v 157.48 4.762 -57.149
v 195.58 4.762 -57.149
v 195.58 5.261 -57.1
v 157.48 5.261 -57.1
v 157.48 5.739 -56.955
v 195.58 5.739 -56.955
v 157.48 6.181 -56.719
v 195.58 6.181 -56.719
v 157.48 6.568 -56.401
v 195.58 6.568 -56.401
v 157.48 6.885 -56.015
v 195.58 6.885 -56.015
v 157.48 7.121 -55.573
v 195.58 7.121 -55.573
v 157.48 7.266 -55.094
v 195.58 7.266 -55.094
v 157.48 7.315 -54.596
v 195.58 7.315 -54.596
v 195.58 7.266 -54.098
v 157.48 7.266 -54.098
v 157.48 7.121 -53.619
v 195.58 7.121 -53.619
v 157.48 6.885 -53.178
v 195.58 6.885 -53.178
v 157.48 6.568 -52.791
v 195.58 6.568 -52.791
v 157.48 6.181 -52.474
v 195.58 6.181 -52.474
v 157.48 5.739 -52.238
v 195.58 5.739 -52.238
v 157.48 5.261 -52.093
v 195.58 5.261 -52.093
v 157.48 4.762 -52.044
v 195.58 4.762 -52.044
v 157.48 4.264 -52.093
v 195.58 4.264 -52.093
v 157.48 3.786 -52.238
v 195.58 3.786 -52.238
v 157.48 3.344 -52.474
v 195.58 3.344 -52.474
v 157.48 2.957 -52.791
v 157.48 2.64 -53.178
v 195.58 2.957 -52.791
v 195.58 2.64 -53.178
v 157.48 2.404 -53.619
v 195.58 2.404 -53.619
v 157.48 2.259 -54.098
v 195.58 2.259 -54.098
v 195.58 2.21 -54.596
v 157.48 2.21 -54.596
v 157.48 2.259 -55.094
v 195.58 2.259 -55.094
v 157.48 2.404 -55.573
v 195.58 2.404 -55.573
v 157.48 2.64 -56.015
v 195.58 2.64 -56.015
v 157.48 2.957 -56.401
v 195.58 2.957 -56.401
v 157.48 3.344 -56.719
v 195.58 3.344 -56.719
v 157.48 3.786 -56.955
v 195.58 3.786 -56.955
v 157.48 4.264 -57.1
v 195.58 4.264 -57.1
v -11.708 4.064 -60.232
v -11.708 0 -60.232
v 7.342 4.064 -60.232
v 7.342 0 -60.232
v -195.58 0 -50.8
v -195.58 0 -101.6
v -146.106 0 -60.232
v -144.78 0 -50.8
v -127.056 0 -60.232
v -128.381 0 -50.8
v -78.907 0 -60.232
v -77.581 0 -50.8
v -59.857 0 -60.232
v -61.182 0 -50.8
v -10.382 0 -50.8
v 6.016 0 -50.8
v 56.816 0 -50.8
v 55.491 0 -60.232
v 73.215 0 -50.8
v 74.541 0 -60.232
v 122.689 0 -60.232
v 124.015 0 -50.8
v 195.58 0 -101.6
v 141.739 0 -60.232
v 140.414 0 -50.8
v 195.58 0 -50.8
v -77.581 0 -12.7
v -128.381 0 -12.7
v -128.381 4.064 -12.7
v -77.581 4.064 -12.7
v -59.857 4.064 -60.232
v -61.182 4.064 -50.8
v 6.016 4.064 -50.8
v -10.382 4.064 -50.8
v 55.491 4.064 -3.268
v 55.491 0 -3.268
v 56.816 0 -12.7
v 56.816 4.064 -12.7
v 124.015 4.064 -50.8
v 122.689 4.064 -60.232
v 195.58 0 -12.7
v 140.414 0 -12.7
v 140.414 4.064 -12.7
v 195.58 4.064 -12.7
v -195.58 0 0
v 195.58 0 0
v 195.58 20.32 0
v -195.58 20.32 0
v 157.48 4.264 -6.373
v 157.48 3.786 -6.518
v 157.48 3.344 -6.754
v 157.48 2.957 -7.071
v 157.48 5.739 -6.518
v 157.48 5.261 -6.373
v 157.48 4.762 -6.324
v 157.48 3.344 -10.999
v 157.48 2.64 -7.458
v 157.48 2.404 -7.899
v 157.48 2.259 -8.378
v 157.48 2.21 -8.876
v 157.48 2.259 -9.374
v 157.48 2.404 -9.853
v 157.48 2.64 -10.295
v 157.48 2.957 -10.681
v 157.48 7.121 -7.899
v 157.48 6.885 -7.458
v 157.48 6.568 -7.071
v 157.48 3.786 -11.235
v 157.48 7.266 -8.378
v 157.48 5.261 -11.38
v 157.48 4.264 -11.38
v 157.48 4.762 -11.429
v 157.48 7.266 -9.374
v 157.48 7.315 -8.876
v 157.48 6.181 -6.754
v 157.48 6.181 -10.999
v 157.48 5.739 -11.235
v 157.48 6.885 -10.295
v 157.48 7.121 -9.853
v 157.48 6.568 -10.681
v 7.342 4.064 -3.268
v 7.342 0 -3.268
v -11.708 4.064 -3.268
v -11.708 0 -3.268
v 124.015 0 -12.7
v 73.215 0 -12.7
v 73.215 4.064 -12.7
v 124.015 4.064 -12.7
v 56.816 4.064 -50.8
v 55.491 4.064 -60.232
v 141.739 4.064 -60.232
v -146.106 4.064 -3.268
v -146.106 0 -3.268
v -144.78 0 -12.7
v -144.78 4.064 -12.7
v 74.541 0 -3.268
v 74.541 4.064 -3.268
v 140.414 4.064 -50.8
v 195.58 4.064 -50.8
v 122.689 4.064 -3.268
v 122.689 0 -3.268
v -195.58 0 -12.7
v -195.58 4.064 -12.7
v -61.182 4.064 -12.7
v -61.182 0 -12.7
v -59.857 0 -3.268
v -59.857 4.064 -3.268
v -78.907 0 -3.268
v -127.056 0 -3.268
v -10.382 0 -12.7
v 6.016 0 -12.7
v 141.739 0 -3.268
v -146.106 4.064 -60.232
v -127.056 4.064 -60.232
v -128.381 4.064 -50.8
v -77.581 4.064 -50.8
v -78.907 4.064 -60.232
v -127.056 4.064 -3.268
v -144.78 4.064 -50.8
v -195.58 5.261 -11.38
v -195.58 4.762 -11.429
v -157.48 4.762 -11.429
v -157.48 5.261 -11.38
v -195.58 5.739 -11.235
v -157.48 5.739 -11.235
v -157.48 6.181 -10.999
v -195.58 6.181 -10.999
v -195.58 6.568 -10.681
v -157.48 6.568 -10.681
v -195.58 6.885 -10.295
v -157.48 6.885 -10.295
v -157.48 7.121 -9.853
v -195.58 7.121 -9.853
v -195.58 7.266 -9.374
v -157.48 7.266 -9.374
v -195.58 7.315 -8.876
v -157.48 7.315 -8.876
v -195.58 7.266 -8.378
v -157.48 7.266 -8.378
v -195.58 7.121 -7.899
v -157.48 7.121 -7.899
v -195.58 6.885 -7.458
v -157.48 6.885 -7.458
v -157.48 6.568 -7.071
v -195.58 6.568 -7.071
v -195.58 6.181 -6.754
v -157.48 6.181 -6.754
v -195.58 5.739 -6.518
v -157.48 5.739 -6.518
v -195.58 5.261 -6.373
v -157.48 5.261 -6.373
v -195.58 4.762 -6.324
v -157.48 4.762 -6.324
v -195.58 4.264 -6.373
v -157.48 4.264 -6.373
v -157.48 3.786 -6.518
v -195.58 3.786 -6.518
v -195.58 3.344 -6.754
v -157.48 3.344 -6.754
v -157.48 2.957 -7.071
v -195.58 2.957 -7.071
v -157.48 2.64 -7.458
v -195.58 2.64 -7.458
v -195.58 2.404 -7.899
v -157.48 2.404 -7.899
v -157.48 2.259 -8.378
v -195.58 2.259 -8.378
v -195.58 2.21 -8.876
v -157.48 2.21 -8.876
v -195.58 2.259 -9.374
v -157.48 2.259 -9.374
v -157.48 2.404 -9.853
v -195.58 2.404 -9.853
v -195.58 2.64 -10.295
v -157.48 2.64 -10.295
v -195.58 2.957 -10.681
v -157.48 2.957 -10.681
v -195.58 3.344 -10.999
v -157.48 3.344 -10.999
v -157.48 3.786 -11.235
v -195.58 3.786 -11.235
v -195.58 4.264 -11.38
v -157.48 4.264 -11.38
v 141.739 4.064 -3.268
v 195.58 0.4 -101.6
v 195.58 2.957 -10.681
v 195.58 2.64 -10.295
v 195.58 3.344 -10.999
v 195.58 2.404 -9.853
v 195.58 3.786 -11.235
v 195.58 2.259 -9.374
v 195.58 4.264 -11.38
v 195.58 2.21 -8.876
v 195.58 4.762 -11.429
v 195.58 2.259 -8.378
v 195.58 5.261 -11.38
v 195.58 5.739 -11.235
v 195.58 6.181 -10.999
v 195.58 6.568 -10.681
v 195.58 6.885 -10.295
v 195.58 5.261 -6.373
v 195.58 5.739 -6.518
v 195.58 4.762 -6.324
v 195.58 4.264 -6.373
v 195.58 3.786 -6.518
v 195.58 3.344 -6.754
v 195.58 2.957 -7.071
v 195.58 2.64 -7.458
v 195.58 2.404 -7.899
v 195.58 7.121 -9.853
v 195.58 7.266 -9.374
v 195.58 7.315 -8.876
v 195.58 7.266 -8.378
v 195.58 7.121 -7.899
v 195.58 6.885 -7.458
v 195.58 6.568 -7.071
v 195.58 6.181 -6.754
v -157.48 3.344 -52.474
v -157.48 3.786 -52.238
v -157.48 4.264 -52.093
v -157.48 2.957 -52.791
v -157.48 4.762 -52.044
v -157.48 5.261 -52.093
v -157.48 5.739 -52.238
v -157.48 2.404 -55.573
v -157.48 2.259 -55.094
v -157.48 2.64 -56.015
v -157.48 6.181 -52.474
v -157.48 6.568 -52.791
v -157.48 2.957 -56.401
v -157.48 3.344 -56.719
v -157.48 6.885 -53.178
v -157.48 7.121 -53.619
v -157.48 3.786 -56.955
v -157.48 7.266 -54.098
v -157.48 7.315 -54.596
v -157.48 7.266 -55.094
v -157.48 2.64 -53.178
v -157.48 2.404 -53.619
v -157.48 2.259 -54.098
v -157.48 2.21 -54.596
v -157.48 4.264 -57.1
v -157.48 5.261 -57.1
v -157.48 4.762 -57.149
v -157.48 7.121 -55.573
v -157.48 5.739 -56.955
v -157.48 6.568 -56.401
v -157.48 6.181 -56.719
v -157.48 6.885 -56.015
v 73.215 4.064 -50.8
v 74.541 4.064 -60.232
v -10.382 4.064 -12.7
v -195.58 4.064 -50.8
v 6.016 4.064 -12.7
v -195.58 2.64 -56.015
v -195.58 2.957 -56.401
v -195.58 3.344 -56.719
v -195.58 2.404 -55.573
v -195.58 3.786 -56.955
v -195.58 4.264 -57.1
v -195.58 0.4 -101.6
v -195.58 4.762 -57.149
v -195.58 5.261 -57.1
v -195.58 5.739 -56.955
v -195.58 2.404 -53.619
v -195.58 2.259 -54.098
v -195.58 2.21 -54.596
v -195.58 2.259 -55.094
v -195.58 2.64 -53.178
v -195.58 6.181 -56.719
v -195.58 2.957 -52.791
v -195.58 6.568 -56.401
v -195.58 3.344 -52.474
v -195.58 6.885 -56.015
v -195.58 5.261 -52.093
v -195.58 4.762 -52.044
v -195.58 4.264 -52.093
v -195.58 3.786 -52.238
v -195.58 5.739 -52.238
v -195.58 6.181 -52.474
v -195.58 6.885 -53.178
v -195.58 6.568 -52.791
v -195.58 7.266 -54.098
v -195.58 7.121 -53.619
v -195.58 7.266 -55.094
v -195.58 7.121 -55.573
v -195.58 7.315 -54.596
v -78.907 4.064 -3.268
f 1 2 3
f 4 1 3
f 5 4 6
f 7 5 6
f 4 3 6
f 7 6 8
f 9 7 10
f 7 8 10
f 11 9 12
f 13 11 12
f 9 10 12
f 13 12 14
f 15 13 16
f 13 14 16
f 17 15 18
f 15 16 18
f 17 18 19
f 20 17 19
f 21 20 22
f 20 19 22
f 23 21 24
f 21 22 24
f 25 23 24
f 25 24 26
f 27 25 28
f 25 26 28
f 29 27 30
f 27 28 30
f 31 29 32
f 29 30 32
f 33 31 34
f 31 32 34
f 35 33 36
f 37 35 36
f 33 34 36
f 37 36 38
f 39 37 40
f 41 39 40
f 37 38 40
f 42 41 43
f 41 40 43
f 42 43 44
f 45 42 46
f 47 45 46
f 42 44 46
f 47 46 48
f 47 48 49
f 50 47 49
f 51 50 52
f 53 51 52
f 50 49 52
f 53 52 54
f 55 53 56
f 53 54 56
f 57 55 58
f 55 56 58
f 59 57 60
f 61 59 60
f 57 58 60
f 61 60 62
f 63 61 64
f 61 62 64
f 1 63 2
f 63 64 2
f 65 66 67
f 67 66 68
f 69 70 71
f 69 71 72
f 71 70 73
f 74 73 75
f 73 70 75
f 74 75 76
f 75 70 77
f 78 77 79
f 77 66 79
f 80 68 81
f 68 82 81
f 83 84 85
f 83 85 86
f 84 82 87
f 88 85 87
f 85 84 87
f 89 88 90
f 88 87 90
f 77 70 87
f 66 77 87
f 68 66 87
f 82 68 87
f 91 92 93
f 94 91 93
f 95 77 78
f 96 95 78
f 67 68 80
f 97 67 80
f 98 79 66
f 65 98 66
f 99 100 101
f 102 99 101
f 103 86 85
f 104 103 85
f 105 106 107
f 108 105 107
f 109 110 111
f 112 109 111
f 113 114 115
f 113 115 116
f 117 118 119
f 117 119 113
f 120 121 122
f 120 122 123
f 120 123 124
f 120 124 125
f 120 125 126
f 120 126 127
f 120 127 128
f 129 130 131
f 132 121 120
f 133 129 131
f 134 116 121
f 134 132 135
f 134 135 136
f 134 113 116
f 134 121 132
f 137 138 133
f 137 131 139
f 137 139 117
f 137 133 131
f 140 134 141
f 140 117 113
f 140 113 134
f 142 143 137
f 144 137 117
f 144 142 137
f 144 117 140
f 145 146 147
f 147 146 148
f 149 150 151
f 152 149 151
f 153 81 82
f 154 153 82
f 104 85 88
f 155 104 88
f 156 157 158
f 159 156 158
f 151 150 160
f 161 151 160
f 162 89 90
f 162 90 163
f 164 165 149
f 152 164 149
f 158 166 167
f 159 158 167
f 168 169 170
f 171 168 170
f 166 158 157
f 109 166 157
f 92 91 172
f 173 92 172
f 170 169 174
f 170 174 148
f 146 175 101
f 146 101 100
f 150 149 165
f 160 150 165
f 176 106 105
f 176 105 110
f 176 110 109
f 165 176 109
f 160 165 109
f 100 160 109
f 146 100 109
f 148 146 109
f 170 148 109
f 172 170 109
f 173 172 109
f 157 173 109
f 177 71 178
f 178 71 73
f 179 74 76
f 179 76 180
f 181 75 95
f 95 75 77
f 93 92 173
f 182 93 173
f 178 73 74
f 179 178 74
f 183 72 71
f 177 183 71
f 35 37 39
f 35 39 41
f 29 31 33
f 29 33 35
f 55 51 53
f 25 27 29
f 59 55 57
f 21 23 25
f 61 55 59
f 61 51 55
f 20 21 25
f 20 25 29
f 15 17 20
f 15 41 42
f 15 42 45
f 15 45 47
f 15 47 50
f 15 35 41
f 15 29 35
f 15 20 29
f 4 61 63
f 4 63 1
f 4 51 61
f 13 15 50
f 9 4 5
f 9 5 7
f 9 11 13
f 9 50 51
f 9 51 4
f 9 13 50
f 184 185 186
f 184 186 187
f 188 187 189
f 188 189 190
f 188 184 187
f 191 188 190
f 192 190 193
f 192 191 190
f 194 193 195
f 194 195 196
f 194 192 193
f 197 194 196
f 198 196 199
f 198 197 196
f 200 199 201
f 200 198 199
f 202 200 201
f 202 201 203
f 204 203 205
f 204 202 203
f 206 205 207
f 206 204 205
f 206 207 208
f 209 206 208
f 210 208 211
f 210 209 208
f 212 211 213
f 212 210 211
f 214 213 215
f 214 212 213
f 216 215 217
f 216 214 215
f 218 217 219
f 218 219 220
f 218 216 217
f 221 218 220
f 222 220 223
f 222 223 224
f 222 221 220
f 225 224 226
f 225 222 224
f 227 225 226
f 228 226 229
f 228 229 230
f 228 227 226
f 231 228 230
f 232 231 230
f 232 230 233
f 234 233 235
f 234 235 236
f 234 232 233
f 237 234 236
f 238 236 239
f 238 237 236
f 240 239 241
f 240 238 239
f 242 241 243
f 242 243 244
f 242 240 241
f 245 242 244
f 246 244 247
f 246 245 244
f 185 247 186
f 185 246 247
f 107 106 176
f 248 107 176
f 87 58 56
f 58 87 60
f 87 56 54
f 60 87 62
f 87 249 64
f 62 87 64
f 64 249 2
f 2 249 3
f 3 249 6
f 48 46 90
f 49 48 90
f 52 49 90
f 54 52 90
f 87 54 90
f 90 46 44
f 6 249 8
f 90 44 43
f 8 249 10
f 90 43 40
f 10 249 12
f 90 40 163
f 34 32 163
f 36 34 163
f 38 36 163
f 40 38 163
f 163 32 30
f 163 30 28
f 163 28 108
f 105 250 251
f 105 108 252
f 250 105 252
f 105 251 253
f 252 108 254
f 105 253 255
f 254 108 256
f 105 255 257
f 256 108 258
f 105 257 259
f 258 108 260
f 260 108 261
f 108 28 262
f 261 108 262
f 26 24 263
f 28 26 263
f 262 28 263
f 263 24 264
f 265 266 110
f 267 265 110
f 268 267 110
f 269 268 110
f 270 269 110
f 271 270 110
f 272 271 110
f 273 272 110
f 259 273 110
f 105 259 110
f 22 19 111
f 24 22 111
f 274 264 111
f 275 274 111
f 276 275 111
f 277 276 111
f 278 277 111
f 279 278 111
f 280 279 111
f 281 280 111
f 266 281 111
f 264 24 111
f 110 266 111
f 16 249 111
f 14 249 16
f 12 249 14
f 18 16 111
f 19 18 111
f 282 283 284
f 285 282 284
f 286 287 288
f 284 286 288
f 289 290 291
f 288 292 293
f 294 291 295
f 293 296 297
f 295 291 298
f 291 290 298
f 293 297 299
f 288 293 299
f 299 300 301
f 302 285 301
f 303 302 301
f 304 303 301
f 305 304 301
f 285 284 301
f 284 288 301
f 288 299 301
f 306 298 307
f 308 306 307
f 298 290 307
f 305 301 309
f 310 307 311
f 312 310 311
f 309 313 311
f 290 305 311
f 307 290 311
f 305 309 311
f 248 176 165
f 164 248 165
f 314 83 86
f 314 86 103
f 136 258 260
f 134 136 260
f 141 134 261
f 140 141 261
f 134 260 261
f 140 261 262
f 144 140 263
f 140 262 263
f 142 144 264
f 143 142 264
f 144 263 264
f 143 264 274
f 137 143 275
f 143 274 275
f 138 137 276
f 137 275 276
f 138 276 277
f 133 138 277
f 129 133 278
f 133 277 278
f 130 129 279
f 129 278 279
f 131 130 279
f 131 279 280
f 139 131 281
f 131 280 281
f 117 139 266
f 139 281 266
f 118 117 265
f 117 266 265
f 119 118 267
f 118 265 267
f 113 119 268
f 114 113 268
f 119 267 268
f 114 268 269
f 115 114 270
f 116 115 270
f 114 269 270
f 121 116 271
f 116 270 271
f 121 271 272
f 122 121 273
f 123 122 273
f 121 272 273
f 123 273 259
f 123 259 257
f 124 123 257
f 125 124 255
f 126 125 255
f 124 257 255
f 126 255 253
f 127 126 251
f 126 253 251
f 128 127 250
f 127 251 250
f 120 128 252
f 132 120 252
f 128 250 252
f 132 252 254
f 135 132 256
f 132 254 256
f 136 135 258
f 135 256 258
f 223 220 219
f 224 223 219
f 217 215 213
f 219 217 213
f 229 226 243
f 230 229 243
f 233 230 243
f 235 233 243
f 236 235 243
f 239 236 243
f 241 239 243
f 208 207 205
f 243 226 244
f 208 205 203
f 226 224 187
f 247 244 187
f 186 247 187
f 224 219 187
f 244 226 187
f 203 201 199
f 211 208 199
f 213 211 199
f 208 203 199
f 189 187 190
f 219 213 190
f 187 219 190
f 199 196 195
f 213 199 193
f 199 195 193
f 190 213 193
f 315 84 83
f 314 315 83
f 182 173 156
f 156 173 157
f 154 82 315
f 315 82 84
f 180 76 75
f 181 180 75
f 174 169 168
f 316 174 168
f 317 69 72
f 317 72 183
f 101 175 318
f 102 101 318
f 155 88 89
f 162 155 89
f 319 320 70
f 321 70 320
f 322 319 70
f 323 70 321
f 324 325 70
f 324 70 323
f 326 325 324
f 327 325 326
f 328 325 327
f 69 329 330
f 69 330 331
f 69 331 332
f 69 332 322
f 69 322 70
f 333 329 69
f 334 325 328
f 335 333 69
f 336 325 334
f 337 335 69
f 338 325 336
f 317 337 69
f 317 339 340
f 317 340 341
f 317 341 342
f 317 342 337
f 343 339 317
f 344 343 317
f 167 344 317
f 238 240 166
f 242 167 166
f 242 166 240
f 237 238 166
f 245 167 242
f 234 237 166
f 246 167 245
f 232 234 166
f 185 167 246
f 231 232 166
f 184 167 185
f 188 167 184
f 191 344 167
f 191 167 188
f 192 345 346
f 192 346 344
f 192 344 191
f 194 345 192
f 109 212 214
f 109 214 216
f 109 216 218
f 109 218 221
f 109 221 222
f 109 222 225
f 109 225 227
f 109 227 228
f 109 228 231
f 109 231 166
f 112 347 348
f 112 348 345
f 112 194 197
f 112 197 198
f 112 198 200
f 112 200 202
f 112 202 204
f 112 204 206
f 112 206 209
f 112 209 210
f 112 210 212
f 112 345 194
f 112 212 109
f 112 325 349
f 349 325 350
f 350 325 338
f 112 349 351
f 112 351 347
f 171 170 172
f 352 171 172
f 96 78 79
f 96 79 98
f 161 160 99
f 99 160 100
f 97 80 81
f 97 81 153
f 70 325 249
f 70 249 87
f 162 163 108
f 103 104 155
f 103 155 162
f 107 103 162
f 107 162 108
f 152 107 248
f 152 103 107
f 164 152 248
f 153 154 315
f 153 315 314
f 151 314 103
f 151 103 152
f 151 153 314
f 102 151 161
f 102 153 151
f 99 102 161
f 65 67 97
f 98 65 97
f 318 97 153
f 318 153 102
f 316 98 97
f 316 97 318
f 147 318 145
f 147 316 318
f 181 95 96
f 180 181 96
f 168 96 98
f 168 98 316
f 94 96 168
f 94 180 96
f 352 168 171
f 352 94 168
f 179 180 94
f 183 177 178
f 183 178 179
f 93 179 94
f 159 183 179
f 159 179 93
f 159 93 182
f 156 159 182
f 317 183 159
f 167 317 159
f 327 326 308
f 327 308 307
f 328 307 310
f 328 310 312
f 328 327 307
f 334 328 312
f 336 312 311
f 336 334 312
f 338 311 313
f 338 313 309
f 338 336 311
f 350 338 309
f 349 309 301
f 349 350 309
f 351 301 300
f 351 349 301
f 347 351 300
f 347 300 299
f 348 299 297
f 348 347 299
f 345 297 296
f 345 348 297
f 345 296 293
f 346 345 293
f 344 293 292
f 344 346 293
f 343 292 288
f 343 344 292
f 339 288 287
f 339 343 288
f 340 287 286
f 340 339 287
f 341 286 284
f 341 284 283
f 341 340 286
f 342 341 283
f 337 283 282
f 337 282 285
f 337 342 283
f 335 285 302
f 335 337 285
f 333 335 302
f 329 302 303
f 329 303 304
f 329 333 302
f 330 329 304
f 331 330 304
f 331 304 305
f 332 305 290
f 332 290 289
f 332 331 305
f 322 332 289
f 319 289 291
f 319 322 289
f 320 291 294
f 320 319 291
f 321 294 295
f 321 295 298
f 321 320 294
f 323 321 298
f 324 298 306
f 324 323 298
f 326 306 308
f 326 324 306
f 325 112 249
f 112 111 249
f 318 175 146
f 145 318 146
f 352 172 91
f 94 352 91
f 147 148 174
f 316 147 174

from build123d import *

# Parameters (mm, degrees)
BOSS_EXTRUDE1_DEPTH = 195.58
SKETCH2_R           = 2.5527
CUT_EXTRUDE1_DEPTH  = 38.1
SKETCH3_W           = 38.1
SKETCH3_H           = 4.064
CUT_EXTRUDE2_DEPTH  = 405.649982083
CUT_EXTRUDE3_DEPTH  = 4.064


with BuildPart() as part:
    # Sketch1 → Boss-Extrude1 (new, symmetric)
    with BuildSketch(Plane(origin=(0, 0, 0), x_dir=(0, 0, -1), z_dir=(1, 0, 0))):
        Polygon((0, 0), (0, 20.32), (101.6, 0.4), (101.6, 0), align=None)
    extrude(amount=BOSS_EXTRUDE1_DEPTH, both=True)

    # Sketch2 → Cut-Extrude1 (cut)
    with BuildSketch(Plane(origin=(195.58, 0, 0), x_dir=(0, 0, -1), z_dir=(1, 0, 0))):
        with Locations((8.876362872, 4.7625)):
            Circle(SKETCH2_R)
        with Locations((54.596362872, 4.7625)):
            Circle(SKETCH2_R)
    cut_extrude1 = extrude(amount=-CUT_EXTRUDE1_DEPTH, mode=Mode.SUBTRACT)

    # Mirror3: Cut-Extrude1 across plane
    add(cut_extrude1.mirror(Plane(origin=(0, 0, 0), x_dir=(0, 0, 1), z_dir=(1, 0, 0))), mode=Mode.SUBTRACT)

    # Sketch3 → Cut-Extrude2 (cut, through all)
    with BuildSketch(Plane.ZY.offset(195.58)):
        with Locations((-31.75, 2.032)):
            Rectangle(SKETCH3_W, SKETCH3_H)
    extrude(amount=-CUT_EXTRUDE2_DEPTH, mode=Mode.SUBTRACT)

    # Sketch4 → Cut-Extrude3 (cut)
    with BuildSketch(Plane.XZ):
        Polygon((-144.78, -50.8), (-146.105623787, -60.232303355), (-144.78, -60.232303355), (-128.381247573, -60.232303355), (-127.055623787, -60.232303355), (-128.381247573, -50.8), align=None)
        Polygon((-77.581247573, -50.8), (-78.90687136, -60.232303355), (-77.581247573, -60.232303355), (-61.182495147, -60.232303355), (-59.85687136, -60.232303355), (-61.182495147, -50.8), align=None)
        Polygon((-10.382495147, -50.8), (-11.708118933, -60.232303355), (-10.382495147, -60.232303355), (6.01625728, -60.232303355), (7.341881067, -60.232303355), (6.01625728, -50.8), align=None)
        Polygon((56.81625728, -50.8), (55.490633493, -60.232303355), (56.81625728, -60.232303355), (73.215009707, -60.232303355), (74.540633493, -60.232303355), (73.215009707, -50.8), align=None)
        Polygon((124.015009707, -50.8), (122.68938592, -60.232303355), (124.015009707, -60.232303355), (140.413762134, -60.232303355), (141.73938592, -60.232303355), (140.413762134, -50.8), align=None)
        Polygon((124.015009707, -12.7), (140.413762134, -12.7), (141.73938592, -3.267696645), (140.413762134, -3.267696645), (124.015009707, -3.267696645), (122.68938592, -3.267696645), align=None)
        Polygon((56.81625728, -12.7), (73.215009707, -12.7), (74.540633493, -3.267696645), (73.215009707, -3.267696645), (56.81625728, -3.267696645), (55.490633493, -3.267696645), align=None)
        Polygon((-10.382495147, -12.7), (6.01625728, -12.7), (7.341881067, -3.267696645), (6.01625728, -3.267696645), (-10.382495147, -3.267696645), (-11.708118933, -3.267696645), align=None)
        Polygon((-77.581247573, -12.7), (-61.182495147, -12.7), (-59.85687136, -3.267696645), (-61.182495147, -3.267696645), (-77.581247573, -3.267696645), (-78.90687136, -3.267696645), align=None)
        Polygon((-144.78, -12.7), (-128.381247573, -12.7), (-127.055623787, -3.267696645), (-128.381247573, -3.267696645), (-144.78, -3.267696645), (-146.105623787, -3.267696645), align=None)
    extrude(amount=-CUT_EXTRUDE3_DEPTH, mode=Mode.SUBTRACT)


solid = part.part
